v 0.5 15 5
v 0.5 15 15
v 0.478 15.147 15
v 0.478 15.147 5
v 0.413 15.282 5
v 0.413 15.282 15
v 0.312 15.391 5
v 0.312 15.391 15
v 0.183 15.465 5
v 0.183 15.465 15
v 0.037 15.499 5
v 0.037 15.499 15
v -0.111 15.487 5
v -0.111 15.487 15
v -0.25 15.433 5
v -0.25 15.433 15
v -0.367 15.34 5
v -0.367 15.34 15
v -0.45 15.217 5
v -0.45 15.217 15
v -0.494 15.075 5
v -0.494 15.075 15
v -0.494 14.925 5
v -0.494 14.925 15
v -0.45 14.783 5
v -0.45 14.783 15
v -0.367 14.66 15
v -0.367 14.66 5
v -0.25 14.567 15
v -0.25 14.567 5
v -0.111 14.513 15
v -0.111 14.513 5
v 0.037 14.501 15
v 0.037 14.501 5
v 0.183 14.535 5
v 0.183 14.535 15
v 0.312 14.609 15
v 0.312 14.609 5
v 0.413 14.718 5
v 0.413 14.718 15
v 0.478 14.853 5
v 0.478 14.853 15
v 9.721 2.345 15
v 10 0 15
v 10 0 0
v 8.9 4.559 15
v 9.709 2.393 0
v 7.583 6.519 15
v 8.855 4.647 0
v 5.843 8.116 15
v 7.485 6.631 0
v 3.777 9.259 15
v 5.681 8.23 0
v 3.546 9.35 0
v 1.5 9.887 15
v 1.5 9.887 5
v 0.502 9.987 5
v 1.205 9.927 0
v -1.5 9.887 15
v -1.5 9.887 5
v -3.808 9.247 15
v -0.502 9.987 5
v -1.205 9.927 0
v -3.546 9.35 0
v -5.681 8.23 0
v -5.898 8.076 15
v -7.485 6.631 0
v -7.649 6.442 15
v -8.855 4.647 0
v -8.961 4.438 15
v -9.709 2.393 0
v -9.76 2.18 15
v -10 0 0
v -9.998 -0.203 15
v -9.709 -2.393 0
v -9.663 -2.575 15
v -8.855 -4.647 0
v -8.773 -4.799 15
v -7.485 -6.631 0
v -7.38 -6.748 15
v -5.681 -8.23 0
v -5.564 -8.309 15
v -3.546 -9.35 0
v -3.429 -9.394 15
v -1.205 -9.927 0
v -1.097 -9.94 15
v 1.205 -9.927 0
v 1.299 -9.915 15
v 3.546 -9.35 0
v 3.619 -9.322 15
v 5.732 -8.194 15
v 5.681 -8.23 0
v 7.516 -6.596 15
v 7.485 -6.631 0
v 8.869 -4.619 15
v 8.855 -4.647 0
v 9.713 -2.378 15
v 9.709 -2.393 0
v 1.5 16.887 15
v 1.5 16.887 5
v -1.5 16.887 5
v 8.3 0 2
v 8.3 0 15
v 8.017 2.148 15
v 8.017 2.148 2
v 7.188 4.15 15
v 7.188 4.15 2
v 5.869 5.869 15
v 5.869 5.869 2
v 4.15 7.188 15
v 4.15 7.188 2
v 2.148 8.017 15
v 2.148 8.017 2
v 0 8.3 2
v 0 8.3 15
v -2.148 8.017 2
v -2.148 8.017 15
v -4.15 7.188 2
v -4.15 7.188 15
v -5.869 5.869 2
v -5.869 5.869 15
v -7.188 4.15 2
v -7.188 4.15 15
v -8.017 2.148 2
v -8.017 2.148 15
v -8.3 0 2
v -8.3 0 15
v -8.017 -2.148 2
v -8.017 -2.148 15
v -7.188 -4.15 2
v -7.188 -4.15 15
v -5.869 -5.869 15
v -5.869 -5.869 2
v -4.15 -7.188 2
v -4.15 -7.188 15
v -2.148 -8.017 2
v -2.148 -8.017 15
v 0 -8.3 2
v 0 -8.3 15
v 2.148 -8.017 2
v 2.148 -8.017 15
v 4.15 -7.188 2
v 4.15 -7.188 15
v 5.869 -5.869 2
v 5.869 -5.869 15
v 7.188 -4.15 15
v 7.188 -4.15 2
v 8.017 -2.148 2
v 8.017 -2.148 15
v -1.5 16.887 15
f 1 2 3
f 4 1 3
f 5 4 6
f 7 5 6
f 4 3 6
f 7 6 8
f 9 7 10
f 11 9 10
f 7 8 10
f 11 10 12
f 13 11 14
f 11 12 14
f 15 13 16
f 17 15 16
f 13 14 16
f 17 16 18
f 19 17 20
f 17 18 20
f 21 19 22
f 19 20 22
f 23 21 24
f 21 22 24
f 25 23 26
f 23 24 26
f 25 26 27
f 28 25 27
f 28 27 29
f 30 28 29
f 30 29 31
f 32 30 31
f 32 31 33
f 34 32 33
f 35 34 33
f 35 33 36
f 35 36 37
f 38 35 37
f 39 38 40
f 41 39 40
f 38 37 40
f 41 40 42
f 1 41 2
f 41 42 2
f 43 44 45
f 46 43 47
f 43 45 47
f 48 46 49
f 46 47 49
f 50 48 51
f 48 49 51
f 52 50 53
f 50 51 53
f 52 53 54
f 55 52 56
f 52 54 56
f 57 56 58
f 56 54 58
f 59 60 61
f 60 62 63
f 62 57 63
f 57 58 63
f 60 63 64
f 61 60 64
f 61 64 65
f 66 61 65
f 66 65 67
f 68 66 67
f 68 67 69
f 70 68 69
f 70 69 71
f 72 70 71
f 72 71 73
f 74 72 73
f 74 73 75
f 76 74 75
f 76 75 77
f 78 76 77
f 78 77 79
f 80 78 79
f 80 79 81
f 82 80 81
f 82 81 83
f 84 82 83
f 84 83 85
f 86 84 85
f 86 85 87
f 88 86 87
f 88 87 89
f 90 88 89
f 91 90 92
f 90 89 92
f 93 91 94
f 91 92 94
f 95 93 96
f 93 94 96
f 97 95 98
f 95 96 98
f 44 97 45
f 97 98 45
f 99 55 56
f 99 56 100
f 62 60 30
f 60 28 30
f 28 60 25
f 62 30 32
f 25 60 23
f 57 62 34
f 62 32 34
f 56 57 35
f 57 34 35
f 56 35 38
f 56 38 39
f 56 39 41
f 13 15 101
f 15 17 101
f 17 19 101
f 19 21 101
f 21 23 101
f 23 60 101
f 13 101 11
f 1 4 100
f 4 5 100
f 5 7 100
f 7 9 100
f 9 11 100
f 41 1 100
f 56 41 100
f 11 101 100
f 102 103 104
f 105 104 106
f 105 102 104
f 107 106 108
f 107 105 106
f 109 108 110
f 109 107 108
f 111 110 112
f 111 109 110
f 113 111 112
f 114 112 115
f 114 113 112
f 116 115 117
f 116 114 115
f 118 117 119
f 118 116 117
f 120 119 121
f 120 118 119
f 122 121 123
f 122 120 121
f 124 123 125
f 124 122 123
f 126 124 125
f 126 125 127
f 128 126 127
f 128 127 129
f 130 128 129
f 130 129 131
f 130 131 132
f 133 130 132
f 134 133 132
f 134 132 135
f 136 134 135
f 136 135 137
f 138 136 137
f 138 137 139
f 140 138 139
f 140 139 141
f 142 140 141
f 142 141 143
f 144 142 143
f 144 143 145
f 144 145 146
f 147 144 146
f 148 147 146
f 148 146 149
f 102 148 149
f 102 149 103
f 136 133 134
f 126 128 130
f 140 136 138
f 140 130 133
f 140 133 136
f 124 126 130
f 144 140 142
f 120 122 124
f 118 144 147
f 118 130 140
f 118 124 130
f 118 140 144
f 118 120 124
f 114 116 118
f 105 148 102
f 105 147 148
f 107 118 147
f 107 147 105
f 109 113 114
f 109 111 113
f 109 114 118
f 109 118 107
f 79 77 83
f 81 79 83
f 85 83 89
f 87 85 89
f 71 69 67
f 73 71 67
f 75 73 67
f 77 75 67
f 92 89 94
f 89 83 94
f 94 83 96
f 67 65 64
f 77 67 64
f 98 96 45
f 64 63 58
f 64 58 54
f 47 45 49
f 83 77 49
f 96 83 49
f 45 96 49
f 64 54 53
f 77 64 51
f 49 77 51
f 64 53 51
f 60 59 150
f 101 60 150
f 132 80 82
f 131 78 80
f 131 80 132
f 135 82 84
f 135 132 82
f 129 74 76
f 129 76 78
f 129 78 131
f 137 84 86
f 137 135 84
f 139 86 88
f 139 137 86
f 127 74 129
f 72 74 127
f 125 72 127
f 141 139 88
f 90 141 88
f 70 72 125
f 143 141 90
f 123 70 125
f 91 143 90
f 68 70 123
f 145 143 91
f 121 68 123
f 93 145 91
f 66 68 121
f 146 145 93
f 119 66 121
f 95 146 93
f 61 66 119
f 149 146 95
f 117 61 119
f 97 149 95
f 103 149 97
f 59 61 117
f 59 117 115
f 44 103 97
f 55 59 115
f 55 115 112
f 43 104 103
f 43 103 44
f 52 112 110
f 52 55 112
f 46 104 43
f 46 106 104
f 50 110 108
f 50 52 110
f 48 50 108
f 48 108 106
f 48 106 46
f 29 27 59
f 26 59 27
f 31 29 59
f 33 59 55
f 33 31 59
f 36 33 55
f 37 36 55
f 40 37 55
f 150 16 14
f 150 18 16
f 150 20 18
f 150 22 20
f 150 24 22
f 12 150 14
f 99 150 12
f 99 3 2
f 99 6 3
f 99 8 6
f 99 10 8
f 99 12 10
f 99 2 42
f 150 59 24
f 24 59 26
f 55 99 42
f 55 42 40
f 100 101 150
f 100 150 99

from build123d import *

# Parameters (mm, degrees)
SKETCH5_R           = 10
SKETCH5_R_2         = 8.3
BOSS_EXTRUDE1_DEPTH = 15
SKETCH6_R           = 10
BOSS_EXTRUDE2_DEPTH = 2
SKETCH7_W           = 3
SKETCH7_H           = 7
SKETCH7_R           = 0.5
BOSS_EXTRUDE3_DEPTH = 10


with BuildPart() as part:
    # Sketch5 → Boss-Extrude1 (new body)
    with BuildSketch(Plane.XY):
        Circle(SKETCH5_R)
        Circle(SKETCH5_R_2, mode=Mode.SUBTRACT)
    extrude(amount=BOSS_EXTRUDE1_DEPTH)

    # Sketch6 → Boss-Extrude2 (add)
    with BuildSketch(Plane.XY):
        Circle(SKETCH6_R)
    extrude(amount=BOSS_EXTRUDE2_DEPTH)

    # Sketch7 → Boss-Extrude3 (add)
    with BuildSketch(Plane.XY.offset(15)):
        with Locations((0, 13.386859967)):
            Rectangle(SKETCH7_W, SKETCH7_H)
        with Locations((0, 15)):
            Circle(SKETCH7_R, mode=Mode.SUBTRACT)
    extrude(amount=-BOSS_EXTRUDE3_DEPTH)


solid = part.part
